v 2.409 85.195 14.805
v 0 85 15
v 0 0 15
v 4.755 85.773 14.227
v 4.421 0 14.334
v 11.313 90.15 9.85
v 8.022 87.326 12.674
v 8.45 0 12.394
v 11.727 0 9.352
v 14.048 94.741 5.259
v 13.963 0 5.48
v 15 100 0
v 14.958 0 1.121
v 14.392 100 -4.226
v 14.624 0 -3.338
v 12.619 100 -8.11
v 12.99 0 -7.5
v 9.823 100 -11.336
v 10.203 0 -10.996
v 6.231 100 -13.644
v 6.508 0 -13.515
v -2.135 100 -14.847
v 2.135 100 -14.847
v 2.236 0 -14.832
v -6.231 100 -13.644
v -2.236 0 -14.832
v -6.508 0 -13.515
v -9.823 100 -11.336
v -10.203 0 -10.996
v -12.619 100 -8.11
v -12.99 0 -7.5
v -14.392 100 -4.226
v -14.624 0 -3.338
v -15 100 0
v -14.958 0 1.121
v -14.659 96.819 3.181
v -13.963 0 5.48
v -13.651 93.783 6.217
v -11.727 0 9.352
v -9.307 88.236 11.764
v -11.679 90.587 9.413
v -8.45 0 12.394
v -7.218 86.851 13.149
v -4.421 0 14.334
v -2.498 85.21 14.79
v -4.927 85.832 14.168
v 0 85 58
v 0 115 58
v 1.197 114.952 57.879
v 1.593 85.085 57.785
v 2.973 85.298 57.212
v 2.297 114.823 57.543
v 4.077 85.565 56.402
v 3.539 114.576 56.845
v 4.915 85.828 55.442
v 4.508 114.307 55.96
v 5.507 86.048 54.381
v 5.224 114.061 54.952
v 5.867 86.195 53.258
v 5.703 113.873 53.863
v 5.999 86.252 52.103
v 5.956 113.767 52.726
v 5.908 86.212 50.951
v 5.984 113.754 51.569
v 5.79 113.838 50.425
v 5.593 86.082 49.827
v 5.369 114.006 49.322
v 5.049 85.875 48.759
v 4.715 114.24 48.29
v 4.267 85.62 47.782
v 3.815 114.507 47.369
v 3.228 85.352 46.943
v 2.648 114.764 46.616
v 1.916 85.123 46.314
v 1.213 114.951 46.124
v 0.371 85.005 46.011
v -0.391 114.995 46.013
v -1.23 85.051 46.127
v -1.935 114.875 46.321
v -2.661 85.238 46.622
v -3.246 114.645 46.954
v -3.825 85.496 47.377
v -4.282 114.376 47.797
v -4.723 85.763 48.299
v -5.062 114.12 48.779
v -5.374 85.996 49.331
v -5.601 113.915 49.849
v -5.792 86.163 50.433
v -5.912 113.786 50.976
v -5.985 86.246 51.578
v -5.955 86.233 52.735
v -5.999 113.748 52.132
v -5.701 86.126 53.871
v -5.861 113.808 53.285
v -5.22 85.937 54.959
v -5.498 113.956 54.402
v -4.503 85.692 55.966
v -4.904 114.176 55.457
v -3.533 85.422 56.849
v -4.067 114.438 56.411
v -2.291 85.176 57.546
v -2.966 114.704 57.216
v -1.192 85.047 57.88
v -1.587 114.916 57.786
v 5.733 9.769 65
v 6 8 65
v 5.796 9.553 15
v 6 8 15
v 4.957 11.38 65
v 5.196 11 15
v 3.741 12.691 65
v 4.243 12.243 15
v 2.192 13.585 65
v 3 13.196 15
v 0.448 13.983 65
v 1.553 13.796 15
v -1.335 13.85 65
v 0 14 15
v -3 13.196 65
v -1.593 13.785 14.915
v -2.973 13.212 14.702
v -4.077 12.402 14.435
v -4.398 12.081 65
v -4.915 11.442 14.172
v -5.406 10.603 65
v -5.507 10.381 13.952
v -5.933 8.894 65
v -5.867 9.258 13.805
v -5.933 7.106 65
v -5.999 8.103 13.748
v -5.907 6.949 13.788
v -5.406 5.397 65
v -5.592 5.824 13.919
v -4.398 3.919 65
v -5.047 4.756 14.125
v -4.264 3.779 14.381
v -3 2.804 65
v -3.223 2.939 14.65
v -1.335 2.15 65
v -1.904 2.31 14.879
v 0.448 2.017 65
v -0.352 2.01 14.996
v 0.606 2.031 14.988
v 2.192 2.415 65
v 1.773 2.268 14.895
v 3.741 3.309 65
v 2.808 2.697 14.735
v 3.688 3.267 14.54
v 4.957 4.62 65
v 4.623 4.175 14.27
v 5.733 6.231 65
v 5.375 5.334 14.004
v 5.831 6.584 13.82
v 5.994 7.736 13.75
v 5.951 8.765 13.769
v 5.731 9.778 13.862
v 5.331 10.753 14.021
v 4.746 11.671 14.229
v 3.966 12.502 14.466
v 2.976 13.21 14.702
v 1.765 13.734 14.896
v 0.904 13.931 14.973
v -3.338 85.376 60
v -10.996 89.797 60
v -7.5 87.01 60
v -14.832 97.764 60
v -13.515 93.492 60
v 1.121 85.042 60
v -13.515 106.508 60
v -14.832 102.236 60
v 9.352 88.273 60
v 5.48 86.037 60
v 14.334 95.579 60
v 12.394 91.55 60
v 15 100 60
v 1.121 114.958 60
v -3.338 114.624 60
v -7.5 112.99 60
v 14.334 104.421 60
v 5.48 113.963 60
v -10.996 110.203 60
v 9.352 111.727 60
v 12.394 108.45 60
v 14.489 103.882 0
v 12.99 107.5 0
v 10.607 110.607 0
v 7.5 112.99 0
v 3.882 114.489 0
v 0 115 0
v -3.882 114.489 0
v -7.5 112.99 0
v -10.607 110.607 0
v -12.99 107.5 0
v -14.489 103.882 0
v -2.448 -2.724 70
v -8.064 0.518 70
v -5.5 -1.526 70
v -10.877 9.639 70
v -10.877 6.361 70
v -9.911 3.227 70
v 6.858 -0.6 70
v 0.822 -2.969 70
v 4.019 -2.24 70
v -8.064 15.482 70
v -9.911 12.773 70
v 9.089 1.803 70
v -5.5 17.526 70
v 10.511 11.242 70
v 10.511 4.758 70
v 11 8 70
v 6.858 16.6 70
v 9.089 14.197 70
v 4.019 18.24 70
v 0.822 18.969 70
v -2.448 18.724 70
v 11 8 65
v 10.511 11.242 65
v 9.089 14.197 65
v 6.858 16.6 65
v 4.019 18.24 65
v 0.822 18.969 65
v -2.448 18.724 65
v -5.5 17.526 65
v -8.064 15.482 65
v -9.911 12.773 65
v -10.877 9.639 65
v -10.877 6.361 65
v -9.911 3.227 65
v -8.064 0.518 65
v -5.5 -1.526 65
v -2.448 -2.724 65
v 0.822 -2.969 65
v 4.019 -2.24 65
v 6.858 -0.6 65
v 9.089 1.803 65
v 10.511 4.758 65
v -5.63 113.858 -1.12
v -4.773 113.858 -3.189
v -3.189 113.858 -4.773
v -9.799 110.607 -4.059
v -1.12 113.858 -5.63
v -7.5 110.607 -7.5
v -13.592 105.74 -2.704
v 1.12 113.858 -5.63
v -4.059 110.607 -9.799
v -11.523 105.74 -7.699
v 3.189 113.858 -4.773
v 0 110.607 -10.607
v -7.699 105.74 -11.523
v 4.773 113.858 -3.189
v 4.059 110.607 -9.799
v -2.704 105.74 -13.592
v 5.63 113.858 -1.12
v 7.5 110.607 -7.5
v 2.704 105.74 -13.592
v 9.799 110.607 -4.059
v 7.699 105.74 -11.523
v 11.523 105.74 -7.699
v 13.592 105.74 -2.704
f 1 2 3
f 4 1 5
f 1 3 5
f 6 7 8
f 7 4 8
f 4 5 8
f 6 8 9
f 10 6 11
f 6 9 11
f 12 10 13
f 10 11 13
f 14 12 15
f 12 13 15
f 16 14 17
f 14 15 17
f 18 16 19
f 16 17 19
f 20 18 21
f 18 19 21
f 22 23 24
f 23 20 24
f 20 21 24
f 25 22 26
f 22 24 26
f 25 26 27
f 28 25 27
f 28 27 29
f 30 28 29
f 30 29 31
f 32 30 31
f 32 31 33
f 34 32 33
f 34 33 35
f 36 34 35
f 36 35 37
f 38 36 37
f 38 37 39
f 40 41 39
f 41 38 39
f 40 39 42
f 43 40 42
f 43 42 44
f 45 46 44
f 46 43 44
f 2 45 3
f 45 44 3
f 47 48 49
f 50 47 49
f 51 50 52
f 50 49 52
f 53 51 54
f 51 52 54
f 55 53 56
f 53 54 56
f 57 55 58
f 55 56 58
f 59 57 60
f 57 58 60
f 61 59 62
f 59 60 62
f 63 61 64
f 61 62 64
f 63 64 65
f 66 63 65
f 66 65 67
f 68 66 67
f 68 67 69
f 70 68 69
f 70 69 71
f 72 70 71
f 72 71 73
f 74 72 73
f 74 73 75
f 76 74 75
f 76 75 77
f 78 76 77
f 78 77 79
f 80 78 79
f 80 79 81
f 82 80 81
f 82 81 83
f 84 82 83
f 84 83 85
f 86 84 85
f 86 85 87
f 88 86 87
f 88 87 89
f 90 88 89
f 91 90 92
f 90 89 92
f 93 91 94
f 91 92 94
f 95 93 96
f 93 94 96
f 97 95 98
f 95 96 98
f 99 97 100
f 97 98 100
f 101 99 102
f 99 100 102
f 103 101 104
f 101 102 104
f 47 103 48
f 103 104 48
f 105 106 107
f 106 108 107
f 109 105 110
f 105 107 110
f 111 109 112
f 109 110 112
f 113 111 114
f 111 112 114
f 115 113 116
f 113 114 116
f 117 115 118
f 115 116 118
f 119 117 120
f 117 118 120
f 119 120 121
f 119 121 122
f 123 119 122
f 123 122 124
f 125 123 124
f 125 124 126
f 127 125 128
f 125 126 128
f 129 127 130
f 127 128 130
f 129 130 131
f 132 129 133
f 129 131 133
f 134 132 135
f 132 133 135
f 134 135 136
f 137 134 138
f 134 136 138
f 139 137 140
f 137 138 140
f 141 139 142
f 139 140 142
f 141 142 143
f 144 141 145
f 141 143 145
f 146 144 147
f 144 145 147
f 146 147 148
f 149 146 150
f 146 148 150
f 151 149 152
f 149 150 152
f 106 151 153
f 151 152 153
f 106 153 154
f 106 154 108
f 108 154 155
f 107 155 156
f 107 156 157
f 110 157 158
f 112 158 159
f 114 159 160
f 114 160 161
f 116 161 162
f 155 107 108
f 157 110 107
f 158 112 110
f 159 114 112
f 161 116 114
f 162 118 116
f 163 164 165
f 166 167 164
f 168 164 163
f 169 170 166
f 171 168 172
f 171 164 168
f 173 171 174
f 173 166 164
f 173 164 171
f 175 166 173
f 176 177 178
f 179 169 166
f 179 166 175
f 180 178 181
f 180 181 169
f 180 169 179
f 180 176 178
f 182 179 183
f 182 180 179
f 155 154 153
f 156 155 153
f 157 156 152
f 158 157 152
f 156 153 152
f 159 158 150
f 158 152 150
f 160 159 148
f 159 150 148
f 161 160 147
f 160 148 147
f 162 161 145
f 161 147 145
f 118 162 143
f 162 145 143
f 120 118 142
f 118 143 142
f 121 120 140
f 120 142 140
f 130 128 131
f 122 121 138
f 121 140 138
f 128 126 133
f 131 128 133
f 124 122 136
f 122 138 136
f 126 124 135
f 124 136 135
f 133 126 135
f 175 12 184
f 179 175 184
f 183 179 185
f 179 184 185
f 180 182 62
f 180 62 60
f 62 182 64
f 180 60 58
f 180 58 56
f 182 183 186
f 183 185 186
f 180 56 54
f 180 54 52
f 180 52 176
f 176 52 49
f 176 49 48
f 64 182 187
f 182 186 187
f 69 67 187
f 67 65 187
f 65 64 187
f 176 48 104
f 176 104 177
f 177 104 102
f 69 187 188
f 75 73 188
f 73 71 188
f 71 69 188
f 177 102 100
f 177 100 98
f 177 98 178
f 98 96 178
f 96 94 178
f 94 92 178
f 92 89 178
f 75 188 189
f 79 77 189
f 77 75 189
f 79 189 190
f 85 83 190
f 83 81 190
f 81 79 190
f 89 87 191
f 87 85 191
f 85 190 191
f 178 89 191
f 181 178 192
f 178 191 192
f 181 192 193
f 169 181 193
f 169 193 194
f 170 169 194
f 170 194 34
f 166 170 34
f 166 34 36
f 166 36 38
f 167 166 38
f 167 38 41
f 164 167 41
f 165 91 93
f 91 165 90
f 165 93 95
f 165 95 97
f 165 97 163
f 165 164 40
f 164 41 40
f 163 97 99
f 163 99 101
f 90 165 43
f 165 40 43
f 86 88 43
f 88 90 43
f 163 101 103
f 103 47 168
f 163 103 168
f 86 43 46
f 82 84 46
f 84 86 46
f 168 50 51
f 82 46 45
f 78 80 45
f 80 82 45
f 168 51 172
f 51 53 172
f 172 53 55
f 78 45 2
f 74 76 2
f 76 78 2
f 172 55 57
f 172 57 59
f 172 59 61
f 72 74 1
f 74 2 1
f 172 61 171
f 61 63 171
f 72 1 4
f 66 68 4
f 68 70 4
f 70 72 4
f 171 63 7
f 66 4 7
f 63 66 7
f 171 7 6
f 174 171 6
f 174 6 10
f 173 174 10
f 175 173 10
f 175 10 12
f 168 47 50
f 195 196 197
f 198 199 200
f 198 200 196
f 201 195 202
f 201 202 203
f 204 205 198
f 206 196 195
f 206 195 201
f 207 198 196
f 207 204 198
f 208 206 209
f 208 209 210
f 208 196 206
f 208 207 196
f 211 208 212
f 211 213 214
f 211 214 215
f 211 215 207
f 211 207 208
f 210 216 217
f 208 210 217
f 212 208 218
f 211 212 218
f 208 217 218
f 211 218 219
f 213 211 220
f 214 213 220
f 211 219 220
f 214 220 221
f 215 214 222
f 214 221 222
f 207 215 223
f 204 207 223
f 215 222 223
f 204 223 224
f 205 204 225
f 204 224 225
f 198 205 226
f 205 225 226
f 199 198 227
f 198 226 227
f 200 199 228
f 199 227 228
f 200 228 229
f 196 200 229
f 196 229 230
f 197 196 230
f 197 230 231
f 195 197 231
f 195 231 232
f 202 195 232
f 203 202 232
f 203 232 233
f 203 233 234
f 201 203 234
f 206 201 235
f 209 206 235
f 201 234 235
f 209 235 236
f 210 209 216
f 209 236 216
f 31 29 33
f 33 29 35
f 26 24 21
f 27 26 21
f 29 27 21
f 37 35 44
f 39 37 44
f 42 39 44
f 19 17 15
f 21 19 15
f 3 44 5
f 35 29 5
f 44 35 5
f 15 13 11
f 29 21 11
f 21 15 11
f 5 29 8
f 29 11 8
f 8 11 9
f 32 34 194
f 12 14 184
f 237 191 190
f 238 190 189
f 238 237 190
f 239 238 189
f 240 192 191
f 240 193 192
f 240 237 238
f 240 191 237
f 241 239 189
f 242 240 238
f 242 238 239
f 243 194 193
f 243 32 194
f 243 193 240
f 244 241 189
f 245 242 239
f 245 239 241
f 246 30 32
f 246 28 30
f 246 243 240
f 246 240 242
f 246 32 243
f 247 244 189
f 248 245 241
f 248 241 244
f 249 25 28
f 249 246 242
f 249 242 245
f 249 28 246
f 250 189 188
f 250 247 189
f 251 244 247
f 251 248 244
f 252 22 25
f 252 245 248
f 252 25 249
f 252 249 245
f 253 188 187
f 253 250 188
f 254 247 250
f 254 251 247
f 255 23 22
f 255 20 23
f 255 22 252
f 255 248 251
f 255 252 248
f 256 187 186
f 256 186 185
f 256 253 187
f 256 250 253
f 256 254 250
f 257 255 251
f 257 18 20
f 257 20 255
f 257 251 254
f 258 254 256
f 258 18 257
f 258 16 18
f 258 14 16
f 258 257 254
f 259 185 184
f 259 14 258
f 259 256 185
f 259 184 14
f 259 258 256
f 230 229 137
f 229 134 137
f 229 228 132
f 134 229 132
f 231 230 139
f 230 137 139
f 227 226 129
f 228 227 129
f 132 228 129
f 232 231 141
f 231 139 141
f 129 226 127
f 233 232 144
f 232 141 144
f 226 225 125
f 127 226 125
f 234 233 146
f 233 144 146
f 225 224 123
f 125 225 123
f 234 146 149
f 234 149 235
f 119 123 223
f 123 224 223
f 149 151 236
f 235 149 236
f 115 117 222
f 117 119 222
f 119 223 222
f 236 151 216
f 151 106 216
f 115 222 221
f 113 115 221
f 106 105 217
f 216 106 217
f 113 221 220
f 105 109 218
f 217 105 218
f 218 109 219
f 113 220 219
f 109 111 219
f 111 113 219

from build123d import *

# Parameters (mm, degrees)
SKETCH1_R                            = 15
BOSS_EXTRUDE1_DEPTH                  = 100
SKETCH2_R                            = 6
BOSS_EXTRUDE2_DEPTH                  = 50
BOSS_EXTRUDE2_DIRECTION_2_REACH      = 107.475
BOSS_EXTRUDE2_DIRECTION_2_END_RADIUS = 15
REVOLVE1_ANGLE                       = 180
SKETCH4_R                            = 15
BOSS_EXTRUDE3_DEPTH                  = 60
SKETCH5_R                            = 6
CUT_EXTRUDE1_DEPTH                   = 30
SKETCH6_R                            = 11
BOSS_EXTRUDE4_DEPTH                  = 5


with BuildPart() as part:
    # Sketch1 → Boss-Extrude1 (new body)
    with BuildSketch(Plane(origin=(0, 0, 0), x_dir=(1, 0, 0), z_dir=(0, 1, 0))):
        with Locations(Location((0, 0, 0), (0, 0, 270))):
            Circle(SKETCH1_R)
    extrude(amount=BOSS_EXTRUDE1_DEPTH)

    # Sketch3 → Revolve1 (revolve)
    with BuildSketch(Plane.XY):
        with BuildLine():
            Line((0, 100), (0, 115))
            ThreePointArc((0, 115), (-10.606601718, 110.606601718), (-15, 100))
            Line((-15, 100), (0, 100))
        make_face()
    revolve(axis=Axis((0, 100, 0), (0, -1, 0)), revolution_arc=REVOLVE1_ANGLE)

    # Sketch4 → Boss-Extrude3 (add)
    with BuildSketch(Plane.XY):
        with Locations((0, 100)):
            Circle(SKETCH4_R)
    extrude(amount=BOSS_EXTRUDE3_DEPTH)

    # Sketch5 → Cut-Extrude1 (cut)
    with BuildSketch(Plane(origin=(0, 115, 0), x_dir=(1, 0, 0), z_dir=(0, 1, 0))):
        with Locations(Location((0, -52, 0), (0, 0, 270))):
            Circle(SKETCH5_R)
    extrude(amount=-CUT_EXTRUDE1_DEPTH, mode=Mode.SUBTRACT)


with BuildPart() as body_2:
    # Sketch2 → Boss-Extrude2 (new body)
    with BuildSketch(Plane.XY.offset(15)):
        with Locations((0, 8)):
            Circle(SKETCH2_R)
    extrude(amount=BOSS_EXTRUDE2_DEPTH)

    # Boss-Extrude2 direction 2: up to this cylinder (the profile starts outside it)
    boss_extrude2_direction_2_end = Plane(origin=(0, 8, 0), z_dir=(0, -1, 0)) * Cylinder(BOSS_EXTRUDE2_DIRECTION_2_END_RADIUS, 245.95, mode=Mode.PRIVATE)
    # Sketch2 → Boss-Extrude2 direction 2 (add, up to the surface)
    with BuildSketch(Plane.XY.offset(15), mode=Mode.PRIVATE) as boss_extrude2_direction_2_sk1:
        with Locations((0, 8)):
            Circle(SKETCH2_R)
    boss_extrude2_direction_2_tool1 = extrude(boss_extrude2_direction_2_sk1.sketch, amount=-BOSS_EXTRUDE2_DIRECTION_2_REACH, mode=Mode.PRIVATE) - boss_extrude2_direction_2_end
    add(boss_extrude2_direction_2_tool1.solids().sort_by_distance((0, 8, 15))[0])
    add(boss_extrude2_direction_2_tool1.solids().sort_by_distance((0, 8, 15))[1])

    # Sketch6 → Boss-Extrude4 (add)
    with BuildSketch(Plane.XY.offset(65)):
        with Locations((0, 8)):
            Circle(SKETCH6_R)
    extrude(amount=BOSS_EXTRUDE4_DEPTH)


solid = Compound([part.part, body_2.part])
